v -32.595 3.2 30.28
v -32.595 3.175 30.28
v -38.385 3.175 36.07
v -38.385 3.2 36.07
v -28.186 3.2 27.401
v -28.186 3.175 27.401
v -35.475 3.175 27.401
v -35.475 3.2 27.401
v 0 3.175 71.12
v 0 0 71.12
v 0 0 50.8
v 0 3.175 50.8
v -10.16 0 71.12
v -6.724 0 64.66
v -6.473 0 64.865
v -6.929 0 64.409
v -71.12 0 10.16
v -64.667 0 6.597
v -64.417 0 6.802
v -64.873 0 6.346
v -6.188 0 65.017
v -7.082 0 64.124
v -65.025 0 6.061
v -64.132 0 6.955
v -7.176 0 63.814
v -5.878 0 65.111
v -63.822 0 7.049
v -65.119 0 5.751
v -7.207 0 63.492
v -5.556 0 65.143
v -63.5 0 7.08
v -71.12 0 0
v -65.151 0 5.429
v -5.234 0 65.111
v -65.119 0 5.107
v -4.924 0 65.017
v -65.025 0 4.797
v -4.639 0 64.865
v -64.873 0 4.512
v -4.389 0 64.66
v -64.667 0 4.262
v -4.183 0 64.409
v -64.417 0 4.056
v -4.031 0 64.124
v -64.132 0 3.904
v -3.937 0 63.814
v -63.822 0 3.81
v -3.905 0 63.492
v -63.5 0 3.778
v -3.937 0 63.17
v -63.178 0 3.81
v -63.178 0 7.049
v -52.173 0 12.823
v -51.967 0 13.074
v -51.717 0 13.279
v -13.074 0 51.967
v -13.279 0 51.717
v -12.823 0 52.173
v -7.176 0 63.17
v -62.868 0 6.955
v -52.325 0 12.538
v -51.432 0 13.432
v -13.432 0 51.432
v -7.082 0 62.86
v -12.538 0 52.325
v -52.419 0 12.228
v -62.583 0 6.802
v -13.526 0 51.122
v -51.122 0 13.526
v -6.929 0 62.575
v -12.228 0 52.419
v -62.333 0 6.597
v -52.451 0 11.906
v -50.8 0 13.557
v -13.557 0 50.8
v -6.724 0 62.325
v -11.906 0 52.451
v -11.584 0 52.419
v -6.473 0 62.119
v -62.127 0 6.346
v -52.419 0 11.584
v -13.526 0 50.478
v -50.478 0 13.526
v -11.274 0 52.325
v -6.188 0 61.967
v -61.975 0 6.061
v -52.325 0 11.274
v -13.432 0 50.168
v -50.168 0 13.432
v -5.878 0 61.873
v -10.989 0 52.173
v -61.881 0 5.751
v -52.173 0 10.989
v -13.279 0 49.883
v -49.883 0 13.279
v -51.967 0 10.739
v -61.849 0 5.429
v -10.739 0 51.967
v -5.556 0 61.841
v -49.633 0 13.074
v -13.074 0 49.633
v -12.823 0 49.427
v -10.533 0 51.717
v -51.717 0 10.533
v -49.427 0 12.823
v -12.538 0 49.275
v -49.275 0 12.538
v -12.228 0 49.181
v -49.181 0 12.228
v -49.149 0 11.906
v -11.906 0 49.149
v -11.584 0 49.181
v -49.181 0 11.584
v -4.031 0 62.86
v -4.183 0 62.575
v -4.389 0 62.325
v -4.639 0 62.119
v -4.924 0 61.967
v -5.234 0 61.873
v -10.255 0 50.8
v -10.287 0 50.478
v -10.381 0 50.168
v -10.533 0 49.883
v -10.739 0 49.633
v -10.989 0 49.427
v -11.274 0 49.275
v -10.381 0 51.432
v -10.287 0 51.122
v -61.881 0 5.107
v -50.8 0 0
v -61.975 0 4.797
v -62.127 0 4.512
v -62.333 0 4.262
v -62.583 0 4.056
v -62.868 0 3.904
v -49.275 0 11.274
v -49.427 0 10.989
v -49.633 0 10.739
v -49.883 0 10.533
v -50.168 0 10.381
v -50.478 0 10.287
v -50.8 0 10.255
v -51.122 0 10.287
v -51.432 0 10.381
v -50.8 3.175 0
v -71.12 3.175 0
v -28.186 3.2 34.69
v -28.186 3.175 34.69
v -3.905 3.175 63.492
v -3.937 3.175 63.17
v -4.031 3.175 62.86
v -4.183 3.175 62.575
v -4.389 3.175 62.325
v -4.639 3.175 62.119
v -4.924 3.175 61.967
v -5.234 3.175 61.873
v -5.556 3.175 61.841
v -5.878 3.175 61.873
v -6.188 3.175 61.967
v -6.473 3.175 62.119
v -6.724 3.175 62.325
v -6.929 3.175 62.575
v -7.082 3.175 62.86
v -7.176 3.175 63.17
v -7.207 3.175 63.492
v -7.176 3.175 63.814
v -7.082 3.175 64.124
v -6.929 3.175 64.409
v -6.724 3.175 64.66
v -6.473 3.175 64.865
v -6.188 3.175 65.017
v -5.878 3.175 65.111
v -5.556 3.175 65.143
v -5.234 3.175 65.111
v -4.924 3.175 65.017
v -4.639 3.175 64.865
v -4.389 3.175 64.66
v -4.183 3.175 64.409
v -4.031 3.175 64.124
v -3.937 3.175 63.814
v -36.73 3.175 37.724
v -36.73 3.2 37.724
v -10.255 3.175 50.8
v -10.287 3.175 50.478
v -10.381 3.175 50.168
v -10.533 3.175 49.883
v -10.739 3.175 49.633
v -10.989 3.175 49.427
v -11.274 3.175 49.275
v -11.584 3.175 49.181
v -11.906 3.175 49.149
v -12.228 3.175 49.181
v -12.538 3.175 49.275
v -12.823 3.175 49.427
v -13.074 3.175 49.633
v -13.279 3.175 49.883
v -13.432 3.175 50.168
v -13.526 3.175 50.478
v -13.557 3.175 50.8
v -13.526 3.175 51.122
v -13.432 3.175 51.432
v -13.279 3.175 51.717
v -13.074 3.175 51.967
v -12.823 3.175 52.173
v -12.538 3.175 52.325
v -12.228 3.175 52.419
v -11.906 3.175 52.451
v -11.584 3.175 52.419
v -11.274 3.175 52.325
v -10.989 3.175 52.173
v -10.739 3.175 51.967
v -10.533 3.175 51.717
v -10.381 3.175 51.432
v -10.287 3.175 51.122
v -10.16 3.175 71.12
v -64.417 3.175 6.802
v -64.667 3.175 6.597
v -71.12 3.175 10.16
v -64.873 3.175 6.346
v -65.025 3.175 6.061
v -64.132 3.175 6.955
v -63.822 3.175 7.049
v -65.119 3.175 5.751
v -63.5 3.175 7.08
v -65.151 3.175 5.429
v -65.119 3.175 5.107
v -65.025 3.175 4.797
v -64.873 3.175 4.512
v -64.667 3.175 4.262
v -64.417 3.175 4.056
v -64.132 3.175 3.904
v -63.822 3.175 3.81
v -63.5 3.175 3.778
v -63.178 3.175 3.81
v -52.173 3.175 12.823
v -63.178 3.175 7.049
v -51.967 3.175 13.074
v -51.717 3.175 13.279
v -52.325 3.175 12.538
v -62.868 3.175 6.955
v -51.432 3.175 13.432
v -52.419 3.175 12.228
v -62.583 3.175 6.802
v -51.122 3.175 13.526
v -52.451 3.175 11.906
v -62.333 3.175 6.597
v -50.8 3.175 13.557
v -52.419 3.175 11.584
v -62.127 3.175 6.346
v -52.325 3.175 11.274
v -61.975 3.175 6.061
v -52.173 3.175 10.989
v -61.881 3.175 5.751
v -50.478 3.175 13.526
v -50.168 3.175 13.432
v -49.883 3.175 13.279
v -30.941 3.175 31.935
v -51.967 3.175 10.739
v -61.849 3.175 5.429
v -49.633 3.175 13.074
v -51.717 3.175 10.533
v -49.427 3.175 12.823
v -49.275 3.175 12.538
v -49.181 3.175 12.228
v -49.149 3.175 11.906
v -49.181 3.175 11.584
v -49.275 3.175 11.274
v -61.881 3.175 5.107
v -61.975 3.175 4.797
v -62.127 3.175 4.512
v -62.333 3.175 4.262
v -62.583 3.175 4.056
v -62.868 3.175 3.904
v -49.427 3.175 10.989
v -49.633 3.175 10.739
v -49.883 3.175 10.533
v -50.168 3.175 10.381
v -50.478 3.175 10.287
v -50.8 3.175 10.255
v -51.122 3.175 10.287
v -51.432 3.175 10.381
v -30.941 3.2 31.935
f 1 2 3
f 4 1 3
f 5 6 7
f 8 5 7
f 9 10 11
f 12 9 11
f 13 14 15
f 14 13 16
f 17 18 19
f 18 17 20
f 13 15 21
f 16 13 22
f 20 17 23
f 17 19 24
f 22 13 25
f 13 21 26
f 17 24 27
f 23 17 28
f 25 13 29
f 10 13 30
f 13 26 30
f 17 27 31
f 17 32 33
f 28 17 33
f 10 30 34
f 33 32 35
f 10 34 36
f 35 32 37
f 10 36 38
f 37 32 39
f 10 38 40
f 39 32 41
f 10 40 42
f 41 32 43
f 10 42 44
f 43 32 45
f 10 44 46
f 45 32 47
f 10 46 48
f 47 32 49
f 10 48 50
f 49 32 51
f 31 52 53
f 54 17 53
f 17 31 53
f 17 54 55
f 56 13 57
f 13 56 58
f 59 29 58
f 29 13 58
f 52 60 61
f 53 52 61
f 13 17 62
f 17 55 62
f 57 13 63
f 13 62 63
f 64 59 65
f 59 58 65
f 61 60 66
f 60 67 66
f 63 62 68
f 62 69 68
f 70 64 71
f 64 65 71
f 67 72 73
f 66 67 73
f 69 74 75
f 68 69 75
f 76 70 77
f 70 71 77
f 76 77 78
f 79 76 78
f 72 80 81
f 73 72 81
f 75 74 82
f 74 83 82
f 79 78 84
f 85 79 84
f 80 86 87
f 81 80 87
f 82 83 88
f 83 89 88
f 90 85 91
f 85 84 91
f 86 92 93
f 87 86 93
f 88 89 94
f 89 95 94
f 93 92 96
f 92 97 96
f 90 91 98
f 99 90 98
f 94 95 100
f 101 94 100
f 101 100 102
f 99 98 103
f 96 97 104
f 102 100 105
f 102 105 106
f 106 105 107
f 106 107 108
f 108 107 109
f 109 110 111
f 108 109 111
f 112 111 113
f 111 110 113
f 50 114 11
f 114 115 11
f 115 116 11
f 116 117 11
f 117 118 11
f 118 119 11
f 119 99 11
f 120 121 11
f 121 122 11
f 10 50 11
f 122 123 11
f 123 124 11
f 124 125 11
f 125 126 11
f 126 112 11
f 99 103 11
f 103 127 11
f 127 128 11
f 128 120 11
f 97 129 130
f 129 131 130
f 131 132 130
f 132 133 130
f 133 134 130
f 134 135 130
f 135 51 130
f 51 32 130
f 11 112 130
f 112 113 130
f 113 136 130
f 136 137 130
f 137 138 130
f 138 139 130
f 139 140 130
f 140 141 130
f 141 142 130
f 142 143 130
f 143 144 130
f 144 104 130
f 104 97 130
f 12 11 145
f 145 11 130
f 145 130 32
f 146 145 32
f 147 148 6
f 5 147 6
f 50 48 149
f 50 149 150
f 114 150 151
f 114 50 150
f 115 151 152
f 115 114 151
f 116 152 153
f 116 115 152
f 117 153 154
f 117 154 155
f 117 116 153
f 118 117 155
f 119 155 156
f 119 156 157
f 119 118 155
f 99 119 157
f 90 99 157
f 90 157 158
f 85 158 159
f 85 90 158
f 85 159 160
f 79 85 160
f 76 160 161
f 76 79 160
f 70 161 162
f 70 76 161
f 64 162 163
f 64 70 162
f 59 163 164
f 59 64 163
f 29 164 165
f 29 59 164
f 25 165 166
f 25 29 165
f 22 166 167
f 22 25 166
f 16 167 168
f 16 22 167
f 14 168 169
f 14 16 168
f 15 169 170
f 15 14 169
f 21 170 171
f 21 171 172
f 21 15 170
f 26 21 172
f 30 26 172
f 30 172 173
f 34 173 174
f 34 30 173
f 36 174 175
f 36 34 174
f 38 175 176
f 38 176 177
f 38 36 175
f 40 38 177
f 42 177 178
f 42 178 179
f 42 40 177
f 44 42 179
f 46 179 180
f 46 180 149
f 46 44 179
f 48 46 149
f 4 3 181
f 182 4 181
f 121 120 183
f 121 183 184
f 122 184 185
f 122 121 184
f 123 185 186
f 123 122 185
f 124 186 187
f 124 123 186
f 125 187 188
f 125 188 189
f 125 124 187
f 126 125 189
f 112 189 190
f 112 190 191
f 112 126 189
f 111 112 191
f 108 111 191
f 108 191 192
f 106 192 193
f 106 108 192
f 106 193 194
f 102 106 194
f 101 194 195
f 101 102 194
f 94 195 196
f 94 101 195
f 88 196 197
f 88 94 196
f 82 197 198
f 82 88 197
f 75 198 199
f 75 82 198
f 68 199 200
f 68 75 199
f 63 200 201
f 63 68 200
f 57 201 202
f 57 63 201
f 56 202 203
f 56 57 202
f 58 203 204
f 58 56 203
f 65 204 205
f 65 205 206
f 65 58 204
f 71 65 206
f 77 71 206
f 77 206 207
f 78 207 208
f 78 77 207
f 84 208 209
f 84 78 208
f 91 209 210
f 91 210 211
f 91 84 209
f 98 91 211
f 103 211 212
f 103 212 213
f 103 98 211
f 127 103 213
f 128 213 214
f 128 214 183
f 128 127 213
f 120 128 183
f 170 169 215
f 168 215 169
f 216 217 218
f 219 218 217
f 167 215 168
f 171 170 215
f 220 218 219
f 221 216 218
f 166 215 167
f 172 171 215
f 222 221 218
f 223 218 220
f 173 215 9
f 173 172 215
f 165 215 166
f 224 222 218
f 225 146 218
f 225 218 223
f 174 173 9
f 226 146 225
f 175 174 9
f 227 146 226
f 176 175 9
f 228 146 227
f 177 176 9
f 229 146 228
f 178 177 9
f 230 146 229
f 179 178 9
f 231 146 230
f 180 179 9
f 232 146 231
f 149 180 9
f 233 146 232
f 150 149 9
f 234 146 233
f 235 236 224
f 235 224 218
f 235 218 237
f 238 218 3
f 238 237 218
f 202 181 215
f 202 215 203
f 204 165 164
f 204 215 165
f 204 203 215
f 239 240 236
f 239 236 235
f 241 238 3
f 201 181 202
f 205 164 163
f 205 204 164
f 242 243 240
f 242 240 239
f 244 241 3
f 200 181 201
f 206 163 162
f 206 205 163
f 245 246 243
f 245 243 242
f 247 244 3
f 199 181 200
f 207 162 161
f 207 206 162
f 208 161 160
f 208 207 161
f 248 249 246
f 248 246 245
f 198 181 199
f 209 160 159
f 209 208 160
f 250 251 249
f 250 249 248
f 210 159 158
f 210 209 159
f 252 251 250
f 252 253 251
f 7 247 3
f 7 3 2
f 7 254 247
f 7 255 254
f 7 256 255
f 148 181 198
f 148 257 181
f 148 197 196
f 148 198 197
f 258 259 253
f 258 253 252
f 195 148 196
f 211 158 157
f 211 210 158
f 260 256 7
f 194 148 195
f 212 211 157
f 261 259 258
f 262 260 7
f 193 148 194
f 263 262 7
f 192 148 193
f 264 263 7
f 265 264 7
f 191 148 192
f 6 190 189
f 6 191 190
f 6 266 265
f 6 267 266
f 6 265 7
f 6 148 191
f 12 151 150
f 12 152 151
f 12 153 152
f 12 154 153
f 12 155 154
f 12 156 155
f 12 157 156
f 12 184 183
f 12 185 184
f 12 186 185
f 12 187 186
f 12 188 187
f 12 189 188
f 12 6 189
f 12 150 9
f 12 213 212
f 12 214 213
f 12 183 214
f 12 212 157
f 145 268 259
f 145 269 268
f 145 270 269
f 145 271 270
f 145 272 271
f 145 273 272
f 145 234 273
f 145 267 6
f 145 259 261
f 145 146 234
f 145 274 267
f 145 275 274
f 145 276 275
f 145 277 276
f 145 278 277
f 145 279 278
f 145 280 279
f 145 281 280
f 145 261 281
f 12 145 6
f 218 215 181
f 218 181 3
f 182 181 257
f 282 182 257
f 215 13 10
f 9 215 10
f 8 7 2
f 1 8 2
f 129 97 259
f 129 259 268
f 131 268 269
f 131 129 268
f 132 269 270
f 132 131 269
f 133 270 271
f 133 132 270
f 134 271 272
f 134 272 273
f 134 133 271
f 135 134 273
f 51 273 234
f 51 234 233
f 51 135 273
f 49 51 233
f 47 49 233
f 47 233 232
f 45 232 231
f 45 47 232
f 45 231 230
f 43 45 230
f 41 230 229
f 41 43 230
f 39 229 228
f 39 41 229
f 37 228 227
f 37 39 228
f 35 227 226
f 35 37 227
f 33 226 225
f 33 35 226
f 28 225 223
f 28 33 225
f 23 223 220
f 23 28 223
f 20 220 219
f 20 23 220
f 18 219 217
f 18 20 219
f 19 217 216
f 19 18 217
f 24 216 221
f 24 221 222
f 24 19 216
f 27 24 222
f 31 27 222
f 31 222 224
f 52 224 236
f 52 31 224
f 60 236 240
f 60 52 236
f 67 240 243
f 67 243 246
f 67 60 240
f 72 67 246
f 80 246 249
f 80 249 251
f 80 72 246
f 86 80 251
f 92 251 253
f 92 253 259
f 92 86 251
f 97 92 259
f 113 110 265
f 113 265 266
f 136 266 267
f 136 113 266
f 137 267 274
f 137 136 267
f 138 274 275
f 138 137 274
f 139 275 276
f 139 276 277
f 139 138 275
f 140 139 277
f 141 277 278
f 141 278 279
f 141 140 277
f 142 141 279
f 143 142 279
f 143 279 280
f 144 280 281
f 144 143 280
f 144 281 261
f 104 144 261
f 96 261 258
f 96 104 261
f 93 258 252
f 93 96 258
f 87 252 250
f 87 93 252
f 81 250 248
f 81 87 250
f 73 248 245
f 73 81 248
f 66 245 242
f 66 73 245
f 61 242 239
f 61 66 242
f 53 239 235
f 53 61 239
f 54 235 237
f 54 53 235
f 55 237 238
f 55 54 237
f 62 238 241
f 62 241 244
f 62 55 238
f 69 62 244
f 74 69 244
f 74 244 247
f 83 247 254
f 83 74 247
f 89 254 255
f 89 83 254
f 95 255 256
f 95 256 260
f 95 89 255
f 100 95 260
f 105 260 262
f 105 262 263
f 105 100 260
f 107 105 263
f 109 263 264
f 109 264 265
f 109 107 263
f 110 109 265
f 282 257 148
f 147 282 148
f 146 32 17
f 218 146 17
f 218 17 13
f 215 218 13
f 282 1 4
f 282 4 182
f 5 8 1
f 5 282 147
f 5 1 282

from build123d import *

# Parameters (mm, degrees)
SKETCH1_R           = 1.651
BOSS_EXTRUDE2_DEPTH = 3.175
BOSS_EXTRUDE3_DEPTH = 0.0254


with BuildPart() as part:
    # Sketch1 → Boss-Extrude2 (new body)
    with BuildSketch(Plane(origin=(0, 0, 0), x_dir=(1, 0, 0), z_dir=(0, 1, 0))):
        Polygon((0, -50.8), (-50.8, 0), (-71.12, 0), (-71.12, -10.16), (-10.16, -71.12), (0, -71.12), align=None)
        with Locations((-5.55625, -63.492108138)):
            Circle(SKETCH1_R, mode=Mode.SUBTRACT)
        with Locations((-11.90625, -50.8)):
            Circle(SKETCH1_R, mode=Mode.SUBTRACT)
        with Locations((-63.5, -5.42925)):
            Circle(SKETCH1_R, mode=Mode.SUBTRACT)
        with Locations((-50.8, -11.90625)):
            Circle(SKETCH1_R, mode=Mode.SUBTRACT)
    extrude(amount=BOSS_EXTRUDE2_DEPTH)

    # Sketch5 → Boss-Extrude3 (add)
    with BuildSketch(Plane(origin=(0, 3.175, 0), x_dir=(1, 0, 0), z_dir=(0, 1, 0))):
        Polygon((-28.185982934, -27.400888033), (-35.474882305, -27.400888033), (-32.595449328, -30.28032101), (-38.384718685, -36.069590367), (-36.729980154, -37.724328898), (-30.940710797, -31.935059541), (-28.185982934, -34.689787404), align=None)
    extrude(amount=BOSS_EXTRUDE3_DEPTH)


solid = part.part
